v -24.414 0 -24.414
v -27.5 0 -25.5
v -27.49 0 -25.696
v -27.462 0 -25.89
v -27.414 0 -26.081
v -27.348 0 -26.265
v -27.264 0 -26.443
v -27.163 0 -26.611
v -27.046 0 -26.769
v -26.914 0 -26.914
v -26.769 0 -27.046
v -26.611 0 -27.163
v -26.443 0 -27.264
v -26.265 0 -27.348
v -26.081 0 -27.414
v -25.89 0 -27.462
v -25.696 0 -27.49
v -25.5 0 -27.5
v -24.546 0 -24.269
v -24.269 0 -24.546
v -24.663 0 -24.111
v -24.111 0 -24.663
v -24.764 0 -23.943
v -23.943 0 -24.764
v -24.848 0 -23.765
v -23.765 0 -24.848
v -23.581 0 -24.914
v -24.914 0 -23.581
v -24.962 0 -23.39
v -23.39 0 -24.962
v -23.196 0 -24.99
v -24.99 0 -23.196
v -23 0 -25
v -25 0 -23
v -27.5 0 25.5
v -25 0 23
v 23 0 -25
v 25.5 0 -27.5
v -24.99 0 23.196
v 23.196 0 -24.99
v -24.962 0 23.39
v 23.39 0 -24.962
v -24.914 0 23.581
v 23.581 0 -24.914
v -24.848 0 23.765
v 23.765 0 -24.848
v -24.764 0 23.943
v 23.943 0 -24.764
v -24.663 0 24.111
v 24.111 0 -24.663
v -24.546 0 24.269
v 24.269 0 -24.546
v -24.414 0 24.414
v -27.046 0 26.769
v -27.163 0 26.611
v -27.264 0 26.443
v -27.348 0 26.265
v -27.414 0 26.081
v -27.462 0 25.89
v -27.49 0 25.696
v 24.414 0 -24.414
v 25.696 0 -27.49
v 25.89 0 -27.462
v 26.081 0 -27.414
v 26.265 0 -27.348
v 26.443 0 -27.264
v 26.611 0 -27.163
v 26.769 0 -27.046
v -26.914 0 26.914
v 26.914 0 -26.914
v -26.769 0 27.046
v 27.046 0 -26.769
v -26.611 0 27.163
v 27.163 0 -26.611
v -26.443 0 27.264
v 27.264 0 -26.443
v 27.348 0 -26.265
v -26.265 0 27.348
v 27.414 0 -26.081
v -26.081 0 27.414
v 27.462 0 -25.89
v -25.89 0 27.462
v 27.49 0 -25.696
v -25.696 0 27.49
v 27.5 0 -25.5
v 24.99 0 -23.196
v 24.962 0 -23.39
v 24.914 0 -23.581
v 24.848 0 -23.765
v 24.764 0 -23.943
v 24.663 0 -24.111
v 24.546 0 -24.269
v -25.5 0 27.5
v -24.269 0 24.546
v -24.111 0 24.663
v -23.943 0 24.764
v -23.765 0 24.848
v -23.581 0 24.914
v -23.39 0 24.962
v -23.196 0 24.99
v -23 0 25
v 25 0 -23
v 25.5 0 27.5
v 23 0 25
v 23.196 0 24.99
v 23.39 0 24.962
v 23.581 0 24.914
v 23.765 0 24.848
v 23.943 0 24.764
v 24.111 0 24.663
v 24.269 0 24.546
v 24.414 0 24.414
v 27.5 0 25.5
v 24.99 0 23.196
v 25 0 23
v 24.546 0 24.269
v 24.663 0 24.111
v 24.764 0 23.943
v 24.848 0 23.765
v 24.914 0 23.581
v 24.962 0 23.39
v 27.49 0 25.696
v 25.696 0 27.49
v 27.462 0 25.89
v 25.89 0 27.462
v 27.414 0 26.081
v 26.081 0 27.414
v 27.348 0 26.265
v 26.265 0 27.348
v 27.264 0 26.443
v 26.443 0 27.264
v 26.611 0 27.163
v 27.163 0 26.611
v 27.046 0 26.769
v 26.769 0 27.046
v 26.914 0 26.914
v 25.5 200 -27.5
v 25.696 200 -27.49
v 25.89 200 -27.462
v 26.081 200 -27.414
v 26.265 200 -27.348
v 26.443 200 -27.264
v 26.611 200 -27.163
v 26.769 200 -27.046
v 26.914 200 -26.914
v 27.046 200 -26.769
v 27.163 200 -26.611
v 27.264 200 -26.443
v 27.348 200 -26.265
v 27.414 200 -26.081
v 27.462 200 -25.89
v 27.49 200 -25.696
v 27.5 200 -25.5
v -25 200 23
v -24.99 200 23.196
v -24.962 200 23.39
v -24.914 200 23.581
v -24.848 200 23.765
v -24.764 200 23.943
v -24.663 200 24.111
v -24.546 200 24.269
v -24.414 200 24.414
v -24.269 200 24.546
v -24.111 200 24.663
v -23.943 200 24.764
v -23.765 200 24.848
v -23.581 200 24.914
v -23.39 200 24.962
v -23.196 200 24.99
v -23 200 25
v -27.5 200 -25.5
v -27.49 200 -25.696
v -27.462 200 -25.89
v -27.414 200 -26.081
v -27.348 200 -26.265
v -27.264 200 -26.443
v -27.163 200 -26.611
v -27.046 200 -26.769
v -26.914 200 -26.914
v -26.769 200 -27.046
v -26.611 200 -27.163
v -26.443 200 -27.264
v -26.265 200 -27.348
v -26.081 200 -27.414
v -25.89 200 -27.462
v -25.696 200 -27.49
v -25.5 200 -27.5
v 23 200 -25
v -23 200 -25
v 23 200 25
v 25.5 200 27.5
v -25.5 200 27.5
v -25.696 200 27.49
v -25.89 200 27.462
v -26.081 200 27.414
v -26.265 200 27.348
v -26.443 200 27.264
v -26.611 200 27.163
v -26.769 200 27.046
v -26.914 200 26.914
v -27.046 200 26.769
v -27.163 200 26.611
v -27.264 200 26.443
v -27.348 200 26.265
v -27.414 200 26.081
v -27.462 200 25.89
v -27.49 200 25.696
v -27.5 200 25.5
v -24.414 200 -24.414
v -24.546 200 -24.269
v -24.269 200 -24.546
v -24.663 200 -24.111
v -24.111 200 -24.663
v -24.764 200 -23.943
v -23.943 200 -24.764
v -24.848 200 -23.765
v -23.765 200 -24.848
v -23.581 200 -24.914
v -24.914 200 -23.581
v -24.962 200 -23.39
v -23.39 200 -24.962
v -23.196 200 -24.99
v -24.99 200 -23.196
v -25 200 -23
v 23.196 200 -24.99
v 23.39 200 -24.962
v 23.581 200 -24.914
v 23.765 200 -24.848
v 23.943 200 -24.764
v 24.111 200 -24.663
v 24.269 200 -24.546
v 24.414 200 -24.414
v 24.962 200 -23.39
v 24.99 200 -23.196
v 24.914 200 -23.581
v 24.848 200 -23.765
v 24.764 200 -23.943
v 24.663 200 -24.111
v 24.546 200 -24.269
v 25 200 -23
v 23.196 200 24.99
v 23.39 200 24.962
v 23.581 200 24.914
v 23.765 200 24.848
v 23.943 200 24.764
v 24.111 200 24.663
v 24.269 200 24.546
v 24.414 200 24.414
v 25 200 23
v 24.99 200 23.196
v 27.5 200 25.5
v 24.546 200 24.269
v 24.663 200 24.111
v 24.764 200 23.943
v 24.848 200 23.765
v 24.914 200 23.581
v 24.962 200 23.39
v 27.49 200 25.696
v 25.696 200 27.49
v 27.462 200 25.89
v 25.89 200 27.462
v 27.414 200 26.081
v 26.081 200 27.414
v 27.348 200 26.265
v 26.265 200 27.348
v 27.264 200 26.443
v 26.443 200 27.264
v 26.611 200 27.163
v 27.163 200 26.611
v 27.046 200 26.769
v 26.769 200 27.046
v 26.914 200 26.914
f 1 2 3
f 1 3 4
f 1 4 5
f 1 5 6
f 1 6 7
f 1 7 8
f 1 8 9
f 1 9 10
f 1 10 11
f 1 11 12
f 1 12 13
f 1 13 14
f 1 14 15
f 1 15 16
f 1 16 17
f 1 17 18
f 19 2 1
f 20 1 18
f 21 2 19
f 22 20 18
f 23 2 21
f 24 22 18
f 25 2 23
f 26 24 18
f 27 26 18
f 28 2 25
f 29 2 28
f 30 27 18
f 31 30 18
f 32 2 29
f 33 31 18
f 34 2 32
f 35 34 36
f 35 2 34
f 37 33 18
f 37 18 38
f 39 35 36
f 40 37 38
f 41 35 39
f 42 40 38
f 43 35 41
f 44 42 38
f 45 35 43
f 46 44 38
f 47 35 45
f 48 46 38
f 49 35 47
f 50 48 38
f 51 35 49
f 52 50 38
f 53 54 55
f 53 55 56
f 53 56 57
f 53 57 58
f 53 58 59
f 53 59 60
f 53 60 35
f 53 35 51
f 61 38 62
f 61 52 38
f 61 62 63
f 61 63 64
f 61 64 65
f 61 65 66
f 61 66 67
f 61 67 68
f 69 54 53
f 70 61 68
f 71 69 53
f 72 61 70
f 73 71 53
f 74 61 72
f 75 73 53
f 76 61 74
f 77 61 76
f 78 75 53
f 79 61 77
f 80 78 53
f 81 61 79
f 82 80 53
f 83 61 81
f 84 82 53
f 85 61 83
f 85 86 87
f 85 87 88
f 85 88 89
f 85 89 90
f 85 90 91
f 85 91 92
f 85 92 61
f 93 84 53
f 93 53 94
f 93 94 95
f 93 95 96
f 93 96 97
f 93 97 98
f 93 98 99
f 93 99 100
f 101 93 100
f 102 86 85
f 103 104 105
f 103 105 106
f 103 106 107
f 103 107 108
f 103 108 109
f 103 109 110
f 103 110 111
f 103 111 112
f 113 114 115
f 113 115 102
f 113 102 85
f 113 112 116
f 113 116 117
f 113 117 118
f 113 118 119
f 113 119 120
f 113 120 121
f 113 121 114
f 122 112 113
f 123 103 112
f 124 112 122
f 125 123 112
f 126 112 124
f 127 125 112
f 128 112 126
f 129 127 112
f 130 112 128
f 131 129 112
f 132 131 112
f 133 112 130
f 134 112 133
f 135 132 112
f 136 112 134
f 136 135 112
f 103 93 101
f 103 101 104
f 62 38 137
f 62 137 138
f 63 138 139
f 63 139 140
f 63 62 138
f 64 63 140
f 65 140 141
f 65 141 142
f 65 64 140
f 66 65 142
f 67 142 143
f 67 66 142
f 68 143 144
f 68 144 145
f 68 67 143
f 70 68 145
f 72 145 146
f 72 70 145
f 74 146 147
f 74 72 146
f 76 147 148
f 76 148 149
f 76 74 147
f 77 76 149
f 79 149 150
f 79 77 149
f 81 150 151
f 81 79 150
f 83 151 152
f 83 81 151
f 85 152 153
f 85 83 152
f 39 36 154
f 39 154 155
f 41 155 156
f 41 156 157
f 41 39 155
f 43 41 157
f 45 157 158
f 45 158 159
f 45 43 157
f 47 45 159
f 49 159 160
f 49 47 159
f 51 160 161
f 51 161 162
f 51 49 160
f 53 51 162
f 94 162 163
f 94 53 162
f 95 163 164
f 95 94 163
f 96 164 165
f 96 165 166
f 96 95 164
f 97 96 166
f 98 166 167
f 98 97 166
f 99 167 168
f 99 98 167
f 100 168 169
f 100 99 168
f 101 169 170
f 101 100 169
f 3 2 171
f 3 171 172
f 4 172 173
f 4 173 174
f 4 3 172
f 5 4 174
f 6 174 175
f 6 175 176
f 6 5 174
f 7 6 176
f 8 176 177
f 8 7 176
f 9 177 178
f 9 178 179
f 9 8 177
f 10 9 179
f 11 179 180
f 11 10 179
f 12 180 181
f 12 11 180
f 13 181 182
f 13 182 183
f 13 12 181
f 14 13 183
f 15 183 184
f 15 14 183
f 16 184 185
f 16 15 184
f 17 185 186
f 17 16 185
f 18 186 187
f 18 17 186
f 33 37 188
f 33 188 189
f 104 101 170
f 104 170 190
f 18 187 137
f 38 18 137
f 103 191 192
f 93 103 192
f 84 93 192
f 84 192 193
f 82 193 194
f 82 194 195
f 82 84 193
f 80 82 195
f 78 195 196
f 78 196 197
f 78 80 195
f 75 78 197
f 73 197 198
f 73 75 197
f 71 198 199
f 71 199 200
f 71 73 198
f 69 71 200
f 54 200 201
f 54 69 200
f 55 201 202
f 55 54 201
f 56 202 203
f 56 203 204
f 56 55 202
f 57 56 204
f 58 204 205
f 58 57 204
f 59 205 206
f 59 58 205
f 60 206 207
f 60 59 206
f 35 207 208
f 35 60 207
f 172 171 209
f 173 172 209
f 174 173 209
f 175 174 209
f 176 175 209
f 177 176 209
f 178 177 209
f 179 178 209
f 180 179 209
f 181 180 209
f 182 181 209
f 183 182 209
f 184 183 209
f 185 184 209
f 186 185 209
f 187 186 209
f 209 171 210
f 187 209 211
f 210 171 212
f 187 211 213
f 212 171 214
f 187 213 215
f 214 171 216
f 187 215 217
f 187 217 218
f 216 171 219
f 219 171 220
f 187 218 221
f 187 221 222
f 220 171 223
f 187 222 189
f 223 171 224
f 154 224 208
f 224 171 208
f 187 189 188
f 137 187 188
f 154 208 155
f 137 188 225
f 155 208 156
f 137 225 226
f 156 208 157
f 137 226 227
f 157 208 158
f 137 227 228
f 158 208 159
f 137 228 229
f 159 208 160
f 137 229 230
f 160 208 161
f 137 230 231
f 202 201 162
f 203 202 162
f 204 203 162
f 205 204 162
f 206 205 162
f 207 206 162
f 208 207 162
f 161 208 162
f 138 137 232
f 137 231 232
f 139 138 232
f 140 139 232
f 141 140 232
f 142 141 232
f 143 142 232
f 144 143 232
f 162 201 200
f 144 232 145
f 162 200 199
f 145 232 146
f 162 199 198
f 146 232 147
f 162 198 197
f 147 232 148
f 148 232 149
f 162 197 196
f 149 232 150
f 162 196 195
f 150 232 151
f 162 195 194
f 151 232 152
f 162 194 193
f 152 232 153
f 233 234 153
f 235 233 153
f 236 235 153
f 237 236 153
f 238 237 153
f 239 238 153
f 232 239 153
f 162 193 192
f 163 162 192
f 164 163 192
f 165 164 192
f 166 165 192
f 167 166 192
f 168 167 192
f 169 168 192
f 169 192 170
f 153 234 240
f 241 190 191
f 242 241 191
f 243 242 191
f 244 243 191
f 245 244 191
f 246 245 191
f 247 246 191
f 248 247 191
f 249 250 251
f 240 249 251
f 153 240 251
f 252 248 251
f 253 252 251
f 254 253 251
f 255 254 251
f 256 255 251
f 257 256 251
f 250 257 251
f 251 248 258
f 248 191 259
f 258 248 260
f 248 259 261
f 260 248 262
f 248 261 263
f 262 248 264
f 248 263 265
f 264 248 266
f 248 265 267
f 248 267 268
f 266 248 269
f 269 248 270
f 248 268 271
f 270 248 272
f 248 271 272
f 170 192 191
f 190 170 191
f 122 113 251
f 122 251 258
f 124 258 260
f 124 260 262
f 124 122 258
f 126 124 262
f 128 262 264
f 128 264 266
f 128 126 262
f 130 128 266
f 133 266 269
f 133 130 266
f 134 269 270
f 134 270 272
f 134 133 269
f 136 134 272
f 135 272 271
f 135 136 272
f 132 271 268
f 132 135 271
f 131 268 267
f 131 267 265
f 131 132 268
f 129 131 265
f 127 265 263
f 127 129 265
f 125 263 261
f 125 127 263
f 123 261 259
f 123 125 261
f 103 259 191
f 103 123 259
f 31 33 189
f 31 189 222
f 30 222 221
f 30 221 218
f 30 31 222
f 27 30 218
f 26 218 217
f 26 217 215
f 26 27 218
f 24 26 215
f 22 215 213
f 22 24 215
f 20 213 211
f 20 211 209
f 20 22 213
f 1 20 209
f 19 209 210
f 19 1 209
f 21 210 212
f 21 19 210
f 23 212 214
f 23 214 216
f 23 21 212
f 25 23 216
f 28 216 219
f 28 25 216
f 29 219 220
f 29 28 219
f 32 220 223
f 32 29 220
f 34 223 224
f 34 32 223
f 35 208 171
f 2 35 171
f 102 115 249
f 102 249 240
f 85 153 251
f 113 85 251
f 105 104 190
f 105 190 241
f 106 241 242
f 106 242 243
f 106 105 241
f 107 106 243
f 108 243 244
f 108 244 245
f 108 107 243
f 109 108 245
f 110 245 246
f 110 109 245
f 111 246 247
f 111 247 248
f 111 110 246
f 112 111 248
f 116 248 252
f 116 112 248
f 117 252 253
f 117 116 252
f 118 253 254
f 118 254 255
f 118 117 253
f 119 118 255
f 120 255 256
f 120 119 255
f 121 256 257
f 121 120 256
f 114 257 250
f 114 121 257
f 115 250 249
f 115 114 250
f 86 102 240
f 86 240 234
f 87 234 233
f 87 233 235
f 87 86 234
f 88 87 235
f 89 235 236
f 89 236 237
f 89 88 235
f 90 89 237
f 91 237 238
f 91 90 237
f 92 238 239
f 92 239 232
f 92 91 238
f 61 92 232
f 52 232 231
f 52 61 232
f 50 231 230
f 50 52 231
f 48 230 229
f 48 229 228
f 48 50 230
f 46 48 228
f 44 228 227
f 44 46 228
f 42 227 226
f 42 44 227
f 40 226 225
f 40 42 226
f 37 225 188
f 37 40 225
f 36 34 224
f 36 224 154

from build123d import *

# Parameters (mm, degrees)
F1_DEPTH = 200


with BuildPart() as f1:
    # F0 (on Front) → F1 (new body)
    with BuildSketch(Plane.XZ):
        with BuildLine():
            ThreePointArc((27.5, 25.5), (26.914214, 26.914214), (25.5, 27.5))
            Line((25.5, 27.5), (-25.5, 27.5))
            ThreePointArc((-25.5, 27.5), (-26.914214, 26.914214), (-27.5, 25.5))
            Line((-27.5, 25.5), (-27.5, -25.5))
            ThreePointArc((-27.5, -25.5), (-26.914214, -26.914214), (-25.5, -27.5))
            Line((-25.5, -27.5), (25.5, -27.5))
            ThreePointArc((25.5, -27.5), (26.914214, -26.914214), (27.5, -25.5))
            Line((27.5, -25.5), (27.5, 25.5))
        make_face()
        with BuildLine():
            Line((-23, 25), (23, 25))
            ThreePointArc((23, 25), (24.414214, 24.414214), (25, 23))
            Line((25, 23), (25, -23))
            ThreePointArc((25, -23), (24.414214, -24.414214), (23, -25))
            Line((23, -25), (-23, -25))
            ThreePointArc((-23, -25), (-24.414214, -24.414214), (-25, -23))
            Line((-25, -23), (-25, 23))
            ThreePointArc((-25, 23), (-24.414214, 24.414214), (-23, 25))
        make_face(mode=Mode.SUBTRACT)
    extrude(amount=-F1_DEPTH)


solid = f1.part
